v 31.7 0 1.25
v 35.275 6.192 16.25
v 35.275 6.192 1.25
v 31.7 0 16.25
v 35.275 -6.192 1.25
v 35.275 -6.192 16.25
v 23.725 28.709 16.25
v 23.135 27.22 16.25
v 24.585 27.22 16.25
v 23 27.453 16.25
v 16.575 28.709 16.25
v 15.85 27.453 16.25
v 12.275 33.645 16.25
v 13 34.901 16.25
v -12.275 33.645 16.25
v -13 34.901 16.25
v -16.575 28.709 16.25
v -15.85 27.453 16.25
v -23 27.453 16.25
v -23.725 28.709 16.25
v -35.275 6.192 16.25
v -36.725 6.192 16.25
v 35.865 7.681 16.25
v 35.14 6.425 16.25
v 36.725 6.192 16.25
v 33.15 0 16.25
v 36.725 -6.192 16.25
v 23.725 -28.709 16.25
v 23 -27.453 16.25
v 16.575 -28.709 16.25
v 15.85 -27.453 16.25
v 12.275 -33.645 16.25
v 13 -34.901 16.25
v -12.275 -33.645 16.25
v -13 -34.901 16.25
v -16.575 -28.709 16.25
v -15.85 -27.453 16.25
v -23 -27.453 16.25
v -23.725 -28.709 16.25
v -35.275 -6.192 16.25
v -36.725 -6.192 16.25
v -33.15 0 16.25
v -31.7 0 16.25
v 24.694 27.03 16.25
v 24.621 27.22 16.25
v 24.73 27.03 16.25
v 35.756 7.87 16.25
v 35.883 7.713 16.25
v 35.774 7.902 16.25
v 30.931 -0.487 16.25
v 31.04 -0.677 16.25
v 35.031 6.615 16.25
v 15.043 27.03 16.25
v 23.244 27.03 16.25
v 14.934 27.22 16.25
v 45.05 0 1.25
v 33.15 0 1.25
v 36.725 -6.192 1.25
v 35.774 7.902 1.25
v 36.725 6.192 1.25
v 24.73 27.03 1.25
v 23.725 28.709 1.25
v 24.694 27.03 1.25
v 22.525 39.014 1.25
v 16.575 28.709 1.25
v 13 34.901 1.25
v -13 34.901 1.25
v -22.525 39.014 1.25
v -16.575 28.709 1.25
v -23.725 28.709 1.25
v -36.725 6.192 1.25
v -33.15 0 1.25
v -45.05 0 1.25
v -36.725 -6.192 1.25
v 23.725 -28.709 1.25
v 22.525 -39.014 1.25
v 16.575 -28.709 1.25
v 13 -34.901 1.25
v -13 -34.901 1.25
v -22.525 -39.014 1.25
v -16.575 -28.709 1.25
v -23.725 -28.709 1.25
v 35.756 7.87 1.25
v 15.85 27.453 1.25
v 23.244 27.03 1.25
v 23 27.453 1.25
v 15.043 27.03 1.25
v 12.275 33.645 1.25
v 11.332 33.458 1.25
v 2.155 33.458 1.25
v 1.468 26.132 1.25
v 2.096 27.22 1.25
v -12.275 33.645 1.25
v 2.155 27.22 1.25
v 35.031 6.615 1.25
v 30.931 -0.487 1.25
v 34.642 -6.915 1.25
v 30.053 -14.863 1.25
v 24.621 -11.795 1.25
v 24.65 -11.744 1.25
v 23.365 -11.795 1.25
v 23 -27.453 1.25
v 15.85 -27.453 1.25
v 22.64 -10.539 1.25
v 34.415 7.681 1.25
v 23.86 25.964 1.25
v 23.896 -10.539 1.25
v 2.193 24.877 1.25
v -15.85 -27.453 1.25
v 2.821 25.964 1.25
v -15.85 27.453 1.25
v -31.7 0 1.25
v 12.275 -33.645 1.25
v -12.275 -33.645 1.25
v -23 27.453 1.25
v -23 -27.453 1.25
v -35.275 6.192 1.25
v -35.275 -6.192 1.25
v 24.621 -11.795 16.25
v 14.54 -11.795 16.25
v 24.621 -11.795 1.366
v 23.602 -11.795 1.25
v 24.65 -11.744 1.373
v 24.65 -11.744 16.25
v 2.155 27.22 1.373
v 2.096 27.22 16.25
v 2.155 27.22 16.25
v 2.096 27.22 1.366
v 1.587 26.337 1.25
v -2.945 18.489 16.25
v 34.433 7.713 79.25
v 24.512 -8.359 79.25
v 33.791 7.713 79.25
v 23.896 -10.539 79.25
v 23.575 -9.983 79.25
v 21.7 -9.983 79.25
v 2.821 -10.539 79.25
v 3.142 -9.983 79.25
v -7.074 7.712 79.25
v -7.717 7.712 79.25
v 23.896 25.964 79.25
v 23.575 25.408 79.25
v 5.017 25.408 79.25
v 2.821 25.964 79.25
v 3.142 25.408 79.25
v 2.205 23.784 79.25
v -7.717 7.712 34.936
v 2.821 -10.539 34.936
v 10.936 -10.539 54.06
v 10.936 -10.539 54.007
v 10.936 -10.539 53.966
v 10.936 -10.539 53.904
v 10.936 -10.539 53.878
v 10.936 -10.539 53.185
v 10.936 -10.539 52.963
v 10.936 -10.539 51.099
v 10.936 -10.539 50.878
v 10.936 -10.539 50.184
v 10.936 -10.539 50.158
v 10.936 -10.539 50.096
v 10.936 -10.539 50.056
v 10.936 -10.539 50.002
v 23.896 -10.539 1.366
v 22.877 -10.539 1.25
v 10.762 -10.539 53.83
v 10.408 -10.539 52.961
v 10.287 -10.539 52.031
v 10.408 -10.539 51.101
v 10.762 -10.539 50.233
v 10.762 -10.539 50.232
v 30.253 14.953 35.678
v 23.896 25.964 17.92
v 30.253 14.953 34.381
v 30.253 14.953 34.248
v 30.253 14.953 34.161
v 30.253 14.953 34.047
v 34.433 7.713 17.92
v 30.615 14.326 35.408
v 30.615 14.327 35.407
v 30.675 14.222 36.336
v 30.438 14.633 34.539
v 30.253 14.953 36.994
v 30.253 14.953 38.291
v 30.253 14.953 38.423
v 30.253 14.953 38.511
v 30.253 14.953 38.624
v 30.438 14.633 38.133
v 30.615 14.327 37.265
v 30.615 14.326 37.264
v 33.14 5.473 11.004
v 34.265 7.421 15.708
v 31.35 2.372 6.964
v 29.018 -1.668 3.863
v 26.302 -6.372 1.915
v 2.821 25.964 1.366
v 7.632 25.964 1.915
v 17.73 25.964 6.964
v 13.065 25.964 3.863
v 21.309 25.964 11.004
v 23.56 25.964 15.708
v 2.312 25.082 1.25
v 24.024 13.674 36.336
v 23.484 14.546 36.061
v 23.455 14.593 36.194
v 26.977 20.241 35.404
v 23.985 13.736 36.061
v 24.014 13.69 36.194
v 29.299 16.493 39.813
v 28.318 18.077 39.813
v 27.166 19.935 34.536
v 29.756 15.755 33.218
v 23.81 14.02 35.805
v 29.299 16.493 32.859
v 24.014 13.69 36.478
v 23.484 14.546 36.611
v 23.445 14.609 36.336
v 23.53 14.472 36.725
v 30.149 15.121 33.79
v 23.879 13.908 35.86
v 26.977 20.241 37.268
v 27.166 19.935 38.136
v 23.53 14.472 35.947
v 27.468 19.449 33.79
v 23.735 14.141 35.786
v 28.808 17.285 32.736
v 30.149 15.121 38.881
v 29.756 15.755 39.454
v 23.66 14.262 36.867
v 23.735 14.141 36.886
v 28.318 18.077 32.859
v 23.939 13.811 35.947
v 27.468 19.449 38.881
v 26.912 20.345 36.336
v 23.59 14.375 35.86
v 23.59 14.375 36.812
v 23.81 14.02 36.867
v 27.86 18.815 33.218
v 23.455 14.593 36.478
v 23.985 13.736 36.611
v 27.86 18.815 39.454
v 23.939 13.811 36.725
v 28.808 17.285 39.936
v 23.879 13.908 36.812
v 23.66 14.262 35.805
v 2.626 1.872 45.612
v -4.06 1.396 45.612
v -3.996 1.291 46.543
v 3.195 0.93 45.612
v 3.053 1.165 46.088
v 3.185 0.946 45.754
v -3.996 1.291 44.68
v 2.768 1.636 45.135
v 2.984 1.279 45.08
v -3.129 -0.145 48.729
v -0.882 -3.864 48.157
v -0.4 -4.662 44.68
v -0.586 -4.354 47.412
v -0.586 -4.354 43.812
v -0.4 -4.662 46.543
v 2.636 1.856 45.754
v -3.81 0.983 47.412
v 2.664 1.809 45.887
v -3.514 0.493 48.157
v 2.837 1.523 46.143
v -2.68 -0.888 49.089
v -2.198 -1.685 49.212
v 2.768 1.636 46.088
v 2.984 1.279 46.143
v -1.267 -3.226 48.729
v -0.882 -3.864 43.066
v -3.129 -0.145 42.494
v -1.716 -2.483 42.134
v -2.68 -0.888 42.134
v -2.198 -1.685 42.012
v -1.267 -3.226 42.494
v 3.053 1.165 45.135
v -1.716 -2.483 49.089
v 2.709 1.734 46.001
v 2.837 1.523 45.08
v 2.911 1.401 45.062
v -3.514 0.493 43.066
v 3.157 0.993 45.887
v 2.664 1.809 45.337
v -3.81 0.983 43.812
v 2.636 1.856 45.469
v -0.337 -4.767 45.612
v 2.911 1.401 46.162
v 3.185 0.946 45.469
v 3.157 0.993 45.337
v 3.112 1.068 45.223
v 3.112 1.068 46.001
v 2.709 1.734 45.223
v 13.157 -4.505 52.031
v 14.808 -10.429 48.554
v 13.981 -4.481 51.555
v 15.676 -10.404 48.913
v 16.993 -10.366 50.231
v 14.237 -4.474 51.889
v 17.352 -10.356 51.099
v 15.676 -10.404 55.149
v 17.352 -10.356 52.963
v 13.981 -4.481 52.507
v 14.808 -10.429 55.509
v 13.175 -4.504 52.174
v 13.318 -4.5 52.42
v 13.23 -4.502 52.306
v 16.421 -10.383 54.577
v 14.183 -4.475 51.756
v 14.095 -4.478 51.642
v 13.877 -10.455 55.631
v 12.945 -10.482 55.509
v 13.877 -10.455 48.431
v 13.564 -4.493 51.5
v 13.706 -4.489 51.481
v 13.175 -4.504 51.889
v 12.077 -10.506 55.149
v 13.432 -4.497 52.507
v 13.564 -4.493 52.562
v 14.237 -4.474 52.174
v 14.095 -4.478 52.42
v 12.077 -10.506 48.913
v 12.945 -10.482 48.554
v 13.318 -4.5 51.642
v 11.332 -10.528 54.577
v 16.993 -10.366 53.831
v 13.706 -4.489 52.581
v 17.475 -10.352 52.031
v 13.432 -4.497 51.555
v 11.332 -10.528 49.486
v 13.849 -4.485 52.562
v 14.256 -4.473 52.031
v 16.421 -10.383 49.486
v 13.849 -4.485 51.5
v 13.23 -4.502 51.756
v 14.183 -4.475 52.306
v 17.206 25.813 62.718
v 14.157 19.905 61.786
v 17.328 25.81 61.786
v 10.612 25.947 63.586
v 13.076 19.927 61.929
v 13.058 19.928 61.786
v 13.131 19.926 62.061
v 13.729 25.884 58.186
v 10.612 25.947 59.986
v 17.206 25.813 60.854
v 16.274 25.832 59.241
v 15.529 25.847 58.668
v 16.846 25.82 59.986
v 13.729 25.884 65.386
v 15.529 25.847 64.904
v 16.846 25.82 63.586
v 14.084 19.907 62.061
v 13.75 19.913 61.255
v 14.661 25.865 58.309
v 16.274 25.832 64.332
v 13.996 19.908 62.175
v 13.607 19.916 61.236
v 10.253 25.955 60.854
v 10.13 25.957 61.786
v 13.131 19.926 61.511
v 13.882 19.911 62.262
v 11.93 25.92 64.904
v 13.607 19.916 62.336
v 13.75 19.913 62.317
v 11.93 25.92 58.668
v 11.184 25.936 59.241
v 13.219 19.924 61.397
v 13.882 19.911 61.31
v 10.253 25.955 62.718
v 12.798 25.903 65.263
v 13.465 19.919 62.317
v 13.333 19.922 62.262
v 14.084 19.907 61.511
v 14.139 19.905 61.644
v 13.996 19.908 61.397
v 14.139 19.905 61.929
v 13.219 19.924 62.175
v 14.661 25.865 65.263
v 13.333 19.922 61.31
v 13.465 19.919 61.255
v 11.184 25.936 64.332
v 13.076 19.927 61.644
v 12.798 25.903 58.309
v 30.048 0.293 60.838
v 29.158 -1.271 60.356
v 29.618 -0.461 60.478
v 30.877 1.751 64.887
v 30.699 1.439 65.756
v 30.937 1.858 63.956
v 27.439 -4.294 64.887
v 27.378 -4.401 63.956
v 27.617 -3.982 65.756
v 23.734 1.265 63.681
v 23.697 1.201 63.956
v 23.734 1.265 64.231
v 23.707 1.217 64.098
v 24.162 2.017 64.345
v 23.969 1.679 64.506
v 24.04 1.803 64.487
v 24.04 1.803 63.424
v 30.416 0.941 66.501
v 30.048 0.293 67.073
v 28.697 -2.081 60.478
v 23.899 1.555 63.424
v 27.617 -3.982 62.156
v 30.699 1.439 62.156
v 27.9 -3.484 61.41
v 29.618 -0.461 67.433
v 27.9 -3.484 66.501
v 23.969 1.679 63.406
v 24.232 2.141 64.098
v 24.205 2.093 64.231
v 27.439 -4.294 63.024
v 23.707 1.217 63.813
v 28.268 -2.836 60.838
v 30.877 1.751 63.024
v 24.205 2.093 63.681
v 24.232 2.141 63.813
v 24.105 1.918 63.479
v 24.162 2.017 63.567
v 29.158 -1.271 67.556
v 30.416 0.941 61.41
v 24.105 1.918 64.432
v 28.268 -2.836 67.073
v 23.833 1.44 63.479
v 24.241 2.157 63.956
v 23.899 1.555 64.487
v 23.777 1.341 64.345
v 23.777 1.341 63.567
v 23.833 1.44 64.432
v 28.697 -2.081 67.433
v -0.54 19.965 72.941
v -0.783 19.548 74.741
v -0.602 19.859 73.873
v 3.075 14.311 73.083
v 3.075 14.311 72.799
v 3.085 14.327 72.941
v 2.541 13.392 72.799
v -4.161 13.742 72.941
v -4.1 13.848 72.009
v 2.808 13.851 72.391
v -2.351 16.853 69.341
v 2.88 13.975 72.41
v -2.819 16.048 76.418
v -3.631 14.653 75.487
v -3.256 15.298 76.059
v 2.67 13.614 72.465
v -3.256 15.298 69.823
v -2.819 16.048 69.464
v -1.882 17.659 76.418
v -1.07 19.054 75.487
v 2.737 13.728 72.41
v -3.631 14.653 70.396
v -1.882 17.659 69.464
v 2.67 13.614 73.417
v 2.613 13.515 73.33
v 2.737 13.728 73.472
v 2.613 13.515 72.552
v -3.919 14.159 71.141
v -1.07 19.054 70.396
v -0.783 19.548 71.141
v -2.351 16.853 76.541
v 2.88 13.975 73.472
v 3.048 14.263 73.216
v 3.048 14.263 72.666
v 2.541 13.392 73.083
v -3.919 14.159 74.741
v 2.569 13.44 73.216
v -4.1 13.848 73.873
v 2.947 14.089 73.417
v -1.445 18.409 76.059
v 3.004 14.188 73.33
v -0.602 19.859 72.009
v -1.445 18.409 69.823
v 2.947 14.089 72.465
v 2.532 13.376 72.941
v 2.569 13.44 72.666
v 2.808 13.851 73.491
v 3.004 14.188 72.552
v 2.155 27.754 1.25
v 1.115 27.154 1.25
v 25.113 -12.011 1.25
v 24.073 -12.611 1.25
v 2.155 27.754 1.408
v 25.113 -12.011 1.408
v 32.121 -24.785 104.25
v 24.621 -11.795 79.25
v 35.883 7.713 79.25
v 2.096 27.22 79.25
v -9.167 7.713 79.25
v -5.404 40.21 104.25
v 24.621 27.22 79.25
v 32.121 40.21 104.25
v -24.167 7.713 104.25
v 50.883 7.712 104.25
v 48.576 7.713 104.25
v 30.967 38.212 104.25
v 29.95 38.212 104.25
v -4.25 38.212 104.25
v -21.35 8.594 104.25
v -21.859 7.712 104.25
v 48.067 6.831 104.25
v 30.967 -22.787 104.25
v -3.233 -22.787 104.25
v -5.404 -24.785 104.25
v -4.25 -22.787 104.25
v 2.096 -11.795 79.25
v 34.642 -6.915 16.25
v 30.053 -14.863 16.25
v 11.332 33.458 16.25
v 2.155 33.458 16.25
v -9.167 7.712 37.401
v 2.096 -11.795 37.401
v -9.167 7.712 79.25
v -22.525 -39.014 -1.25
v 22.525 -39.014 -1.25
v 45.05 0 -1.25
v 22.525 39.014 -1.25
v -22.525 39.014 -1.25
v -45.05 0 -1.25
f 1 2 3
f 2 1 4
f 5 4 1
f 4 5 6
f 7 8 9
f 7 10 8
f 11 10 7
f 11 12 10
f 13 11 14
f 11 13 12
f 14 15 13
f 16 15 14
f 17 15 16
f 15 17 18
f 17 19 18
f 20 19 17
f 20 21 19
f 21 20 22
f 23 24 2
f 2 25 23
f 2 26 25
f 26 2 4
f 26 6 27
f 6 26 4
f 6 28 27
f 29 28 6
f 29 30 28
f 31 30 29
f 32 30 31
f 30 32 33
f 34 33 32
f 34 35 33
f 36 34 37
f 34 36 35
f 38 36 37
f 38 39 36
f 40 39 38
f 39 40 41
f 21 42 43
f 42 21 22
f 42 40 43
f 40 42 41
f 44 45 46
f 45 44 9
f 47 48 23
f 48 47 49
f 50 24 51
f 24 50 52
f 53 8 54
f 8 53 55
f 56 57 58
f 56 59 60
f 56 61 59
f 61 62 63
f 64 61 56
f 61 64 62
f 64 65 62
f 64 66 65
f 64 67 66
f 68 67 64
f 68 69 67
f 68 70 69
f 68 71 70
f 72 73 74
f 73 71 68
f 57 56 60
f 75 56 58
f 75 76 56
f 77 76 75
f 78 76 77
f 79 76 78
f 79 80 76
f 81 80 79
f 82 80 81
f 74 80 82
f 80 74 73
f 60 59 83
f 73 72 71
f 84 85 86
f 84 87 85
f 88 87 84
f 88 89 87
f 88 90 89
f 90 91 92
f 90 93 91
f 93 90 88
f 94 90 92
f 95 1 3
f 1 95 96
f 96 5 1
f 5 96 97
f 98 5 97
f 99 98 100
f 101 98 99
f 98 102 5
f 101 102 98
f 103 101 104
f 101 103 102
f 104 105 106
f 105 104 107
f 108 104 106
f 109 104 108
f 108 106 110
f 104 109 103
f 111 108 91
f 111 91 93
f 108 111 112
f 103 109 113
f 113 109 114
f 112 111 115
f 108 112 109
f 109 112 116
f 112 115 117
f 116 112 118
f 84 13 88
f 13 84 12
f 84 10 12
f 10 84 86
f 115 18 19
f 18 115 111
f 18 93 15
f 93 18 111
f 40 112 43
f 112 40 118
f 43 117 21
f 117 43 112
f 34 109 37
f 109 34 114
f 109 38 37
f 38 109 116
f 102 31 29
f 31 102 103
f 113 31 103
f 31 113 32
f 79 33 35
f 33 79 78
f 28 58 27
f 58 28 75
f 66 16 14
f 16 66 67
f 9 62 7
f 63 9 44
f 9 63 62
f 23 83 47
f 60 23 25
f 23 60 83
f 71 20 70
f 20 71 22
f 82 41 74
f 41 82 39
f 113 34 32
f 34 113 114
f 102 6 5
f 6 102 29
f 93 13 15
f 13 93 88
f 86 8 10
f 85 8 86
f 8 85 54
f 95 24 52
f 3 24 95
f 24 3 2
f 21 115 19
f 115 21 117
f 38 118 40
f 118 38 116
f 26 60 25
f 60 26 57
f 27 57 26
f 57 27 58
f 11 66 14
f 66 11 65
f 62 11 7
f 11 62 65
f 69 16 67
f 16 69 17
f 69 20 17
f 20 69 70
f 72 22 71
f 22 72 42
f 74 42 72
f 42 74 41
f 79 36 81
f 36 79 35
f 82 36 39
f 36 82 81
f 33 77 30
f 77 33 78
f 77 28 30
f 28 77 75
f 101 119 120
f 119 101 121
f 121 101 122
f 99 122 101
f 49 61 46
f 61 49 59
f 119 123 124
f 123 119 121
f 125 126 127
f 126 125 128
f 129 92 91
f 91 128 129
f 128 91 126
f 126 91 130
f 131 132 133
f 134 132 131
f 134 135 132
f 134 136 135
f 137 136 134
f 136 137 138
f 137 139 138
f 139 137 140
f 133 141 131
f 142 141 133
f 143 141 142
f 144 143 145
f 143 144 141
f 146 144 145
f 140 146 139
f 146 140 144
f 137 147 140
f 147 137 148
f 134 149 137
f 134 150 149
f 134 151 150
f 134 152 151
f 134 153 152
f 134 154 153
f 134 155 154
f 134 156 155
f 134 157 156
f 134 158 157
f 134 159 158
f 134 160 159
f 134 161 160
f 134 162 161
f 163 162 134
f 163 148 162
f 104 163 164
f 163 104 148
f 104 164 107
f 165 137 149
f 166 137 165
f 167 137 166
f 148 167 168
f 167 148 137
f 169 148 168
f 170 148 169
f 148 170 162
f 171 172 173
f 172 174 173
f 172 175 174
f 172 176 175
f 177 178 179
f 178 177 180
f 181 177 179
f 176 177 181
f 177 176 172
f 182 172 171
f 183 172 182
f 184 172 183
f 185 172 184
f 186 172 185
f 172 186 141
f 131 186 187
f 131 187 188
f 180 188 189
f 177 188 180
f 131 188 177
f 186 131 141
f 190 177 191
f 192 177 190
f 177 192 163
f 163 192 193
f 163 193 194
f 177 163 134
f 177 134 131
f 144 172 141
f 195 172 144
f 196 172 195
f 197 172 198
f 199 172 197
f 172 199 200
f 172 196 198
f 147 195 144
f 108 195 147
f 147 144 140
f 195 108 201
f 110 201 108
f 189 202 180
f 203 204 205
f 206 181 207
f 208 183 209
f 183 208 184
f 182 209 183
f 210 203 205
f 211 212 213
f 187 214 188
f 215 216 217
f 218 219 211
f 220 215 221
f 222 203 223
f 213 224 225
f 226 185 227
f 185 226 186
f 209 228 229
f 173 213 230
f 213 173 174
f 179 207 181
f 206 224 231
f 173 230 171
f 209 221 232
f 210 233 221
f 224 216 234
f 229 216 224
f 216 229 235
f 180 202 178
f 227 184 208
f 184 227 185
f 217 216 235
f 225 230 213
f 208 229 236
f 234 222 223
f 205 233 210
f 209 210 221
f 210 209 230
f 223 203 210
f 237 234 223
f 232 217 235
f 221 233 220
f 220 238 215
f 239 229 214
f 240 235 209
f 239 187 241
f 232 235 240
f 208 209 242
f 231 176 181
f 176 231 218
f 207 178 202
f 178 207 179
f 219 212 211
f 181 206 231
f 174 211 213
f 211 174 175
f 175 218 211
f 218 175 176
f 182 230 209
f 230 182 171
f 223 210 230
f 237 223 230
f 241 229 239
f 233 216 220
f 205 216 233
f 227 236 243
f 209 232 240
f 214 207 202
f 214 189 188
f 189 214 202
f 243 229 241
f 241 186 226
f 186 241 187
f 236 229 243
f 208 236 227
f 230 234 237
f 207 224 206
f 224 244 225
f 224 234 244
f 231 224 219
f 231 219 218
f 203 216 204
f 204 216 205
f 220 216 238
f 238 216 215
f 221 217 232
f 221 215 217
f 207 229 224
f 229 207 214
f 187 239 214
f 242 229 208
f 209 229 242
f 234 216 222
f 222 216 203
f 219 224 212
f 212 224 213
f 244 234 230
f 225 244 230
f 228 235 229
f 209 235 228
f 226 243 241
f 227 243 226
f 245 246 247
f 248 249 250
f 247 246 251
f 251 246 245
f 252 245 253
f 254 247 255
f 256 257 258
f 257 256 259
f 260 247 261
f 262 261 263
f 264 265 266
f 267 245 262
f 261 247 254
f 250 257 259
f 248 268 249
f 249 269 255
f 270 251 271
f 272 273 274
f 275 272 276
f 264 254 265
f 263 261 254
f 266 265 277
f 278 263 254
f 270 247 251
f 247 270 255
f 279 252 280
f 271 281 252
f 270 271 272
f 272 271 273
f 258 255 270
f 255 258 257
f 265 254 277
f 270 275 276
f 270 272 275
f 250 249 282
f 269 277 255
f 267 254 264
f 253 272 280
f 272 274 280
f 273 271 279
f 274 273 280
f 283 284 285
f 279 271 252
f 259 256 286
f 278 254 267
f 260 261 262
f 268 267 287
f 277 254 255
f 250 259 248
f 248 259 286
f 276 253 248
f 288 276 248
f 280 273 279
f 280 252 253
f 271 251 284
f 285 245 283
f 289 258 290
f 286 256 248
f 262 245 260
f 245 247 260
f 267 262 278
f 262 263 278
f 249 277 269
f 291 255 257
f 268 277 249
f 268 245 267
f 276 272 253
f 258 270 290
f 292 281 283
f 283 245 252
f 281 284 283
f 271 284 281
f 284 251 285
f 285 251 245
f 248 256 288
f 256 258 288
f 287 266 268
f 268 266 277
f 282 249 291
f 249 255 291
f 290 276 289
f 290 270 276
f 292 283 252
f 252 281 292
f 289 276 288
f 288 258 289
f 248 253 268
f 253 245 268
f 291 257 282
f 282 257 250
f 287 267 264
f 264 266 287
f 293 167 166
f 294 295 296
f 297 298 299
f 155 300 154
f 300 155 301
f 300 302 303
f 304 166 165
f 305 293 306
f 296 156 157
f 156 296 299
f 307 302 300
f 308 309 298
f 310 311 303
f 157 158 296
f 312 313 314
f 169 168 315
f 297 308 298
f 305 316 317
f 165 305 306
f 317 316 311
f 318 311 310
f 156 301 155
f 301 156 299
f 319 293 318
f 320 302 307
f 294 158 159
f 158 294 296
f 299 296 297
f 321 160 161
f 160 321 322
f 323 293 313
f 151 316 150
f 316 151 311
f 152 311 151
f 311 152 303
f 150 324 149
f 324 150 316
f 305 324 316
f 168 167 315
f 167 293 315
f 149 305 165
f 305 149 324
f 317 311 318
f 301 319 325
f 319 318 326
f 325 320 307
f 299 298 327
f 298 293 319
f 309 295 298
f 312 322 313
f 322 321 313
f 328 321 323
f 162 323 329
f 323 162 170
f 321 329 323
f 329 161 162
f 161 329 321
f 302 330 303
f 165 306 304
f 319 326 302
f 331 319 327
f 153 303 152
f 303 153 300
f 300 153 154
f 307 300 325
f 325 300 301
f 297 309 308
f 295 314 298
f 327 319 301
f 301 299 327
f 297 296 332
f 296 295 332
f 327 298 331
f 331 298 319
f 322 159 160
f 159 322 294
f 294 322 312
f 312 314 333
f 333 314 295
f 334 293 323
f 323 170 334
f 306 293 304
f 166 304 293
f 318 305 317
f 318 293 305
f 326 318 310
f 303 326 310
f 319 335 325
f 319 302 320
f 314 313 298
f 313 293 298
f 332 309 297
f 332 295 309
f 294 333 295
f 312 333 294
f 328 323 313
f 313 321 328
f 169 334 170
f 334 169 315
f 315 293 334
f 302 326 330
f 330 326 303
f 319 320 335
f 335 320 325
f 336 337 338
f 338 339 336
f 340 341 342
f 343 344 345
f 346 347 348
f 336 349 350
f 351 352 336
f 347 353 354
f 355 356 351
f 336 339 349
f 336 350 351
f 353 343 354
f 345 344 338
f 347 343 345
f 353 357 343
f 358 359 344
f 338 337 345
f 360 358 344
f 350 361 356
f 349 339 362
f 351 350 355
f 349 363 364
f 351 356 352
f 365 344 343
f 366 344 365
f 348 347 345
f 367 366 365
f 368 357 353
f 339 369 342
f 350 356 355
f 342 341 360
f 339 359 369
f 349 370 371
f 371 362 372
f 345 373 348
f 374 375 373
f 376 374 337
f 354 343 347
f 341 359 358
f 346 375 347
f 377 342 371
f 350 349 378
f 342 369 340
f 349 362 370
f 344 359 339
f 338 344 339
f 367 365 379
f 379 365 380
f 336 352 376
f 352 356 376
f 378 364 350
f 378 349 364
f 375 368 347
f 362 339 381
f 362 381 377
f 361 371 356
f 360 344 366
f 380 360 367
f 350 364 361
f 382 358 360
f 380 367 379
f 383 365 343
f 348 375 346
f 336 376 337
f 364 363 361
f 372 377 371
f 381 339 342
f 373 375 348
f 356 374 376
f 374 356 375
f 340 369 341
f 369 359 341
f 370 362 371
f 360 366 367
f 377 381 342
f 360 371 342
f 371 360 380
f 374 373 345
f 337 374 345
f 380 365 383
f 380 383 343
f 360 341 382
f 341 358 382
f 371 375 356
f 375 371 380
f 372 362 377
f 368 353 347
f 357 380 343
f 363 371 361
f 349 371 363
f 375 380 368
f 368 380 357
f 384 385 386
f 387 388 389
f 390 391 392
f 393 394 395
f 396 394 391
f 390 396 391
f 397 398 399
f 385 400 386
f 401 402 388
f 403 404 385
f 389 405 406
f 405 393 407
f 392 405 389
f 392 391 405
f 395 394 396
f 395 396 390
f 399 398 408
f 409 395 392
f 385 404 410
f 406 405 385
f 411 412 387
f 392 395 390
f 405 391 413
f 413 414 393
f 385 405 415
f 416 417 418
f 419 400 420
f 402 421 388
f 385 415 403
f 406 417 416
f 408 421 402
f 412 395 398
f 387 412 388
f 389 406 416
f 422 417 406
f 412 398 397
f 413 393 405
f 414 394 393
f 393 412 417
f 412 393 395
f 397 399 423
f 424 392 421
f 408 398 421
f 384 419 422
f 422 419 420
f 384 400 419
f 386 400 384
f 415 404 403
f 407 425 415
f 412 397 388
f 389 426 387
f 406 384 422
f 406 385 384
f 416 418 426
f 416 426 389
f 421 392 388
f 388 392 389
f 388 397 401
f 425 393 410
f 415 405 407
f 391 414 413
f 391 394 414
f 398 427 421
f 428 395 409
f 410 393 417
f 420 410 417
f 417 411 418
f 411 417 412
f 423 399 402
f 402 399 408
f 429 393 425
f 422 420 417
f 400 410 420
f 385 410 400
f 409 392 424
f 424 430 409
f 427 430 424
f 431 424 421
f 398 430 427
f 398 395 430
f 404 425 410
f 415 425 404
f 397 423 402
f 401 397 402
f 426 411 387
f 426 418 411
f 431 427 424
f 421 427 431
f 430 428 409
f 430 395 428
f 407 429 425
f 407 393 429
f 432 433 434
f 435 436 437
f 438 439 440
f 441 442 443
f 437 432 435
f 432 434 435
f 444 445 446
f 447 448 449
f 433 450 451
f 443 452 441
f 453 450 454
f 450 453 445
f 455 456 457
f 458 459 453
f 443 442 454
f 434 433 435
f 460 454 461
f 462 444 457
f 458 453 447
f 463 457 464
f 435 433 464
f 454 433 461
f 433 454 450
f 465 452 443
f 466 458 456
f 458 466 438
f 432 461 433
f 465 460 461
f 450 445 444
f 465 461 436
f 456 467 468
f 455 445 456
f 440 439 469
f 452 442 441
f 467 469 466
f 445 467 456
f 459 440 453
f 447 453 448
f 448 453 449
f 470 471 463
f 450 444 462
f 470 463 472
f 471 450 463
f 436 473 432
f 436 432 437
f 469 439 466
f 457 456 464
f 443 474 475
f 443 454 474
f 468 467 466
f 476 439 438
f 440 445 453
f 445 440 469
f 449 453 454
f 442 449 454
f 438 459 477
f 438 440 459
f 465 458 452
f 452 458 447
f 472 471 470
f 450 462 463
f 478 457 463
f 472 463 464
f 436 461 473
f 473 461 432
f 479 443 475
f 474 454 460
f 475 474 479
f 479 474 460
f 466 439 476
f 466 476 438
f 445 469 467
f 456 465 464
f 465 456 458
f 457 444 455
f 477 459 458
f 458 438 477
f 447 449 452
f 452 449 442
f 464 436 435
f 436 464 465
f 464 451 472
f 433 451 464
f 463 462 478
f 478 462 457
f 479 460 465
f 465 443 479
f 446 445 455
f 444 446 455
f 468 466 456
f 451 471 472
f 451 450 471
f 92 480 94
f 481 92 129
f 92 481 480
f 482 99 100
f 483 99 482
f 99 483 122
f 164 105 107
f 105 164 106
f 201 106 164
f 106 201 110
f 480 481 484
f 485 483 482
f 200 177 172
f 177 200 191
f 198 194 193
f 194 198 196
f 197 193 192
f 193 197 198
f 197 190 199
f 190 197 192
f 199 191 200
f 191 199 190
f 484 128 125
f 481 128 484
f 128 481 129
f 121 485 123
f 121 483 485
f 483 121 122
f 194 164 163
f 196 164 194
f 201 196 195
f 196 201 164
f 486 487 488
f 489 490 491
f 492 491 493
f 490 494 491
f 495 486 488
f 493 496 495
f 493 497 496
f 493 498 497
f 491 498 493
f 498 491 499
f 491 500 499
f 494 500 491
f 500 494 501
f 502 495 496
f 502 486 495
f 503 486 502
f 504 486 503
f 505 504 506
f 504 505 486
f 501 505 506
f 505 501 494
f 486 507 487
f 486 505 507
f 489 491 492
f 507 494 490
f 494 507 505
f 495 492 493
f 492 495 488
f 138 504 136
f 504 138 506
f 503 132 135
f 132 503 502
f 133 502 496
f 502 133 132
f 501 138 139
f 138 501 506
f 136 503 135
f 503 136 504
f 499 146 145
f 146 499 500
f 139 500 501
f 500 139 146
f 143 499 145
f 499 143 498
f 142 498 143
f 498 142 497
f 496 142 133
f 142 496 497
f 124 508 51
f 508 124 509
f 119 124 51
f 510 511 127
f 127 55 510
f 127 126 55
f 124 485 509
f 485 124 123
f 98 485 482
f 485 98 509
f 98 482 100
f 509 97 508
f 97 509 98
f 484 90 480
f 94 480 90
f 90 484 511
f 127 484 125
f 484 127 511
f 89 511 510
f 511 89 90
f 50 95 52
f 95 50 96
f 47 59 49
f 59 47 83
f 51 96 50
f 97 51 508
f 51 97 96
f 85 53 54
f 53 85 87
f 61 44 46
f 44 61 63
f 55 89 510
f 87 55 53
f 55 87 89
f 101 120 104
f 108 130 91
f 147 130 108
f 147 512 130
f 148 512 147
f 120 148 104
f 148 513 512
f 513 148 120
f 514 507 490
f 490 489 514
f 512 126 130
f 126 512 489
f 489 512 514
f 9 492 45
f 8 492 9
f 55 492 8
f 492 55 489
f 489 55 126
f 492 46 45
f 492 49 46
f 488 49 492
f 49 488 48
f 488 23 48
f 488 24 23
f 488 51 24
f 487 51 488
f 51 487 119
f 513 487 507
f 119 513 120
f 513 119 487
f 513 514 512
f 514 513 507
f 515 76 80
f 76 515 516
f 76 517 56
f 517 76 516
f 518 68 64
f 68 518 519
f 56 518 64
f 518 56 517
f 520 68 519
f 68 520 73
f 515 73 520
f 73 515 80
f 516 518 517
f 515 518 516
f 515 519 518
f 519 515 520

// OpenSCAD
//
$fn = $preview ? 16 : 24;

base_h = 2.5;
base_d = 90 + 0.1;

border_d = base_d - 9.5;
border_w = 2.9;
border_h = 15;
place_d = 23;

tower_d = base_d/2 + 0 * 1.3 * border_w;
tower_h = 78;
cos30 = cos(30);
echo(str("cos30=", cos30));
//tower_x = sin(60) * base_d/4 - border_w*3;
tower_x = base_d/2 - tower_d/2 - (base_d - border_d)/2 - border_w/2 - 0.9;
//tower_x = base_d/2 - tower_d/2 - (border_d - border_w)/2;
tower_y = cos(60) * tower_x;
obs_h = tower_d/3 - 3.12 * border_w;
obs_bs1 = 7.2;
obs_bs2 = 1.1;

rut_h = tower_d/2*cos30;
rut_b = tower_d / 1 + cos30;

rem_out_pla_inner_x = +07.8;
rem_out_pla_outer_y = -16.4;

tri_h  = 25;
tri_d2 = tower_d + 30;

// base 
cylinder(h=base_h, d=base_d, center=true, $fn=6);

// border 
translate([0, 0, base_h/2])
difference(){
    union () {
        cylinder(h=border_h, d=border_d, $fn=6);
    }
    // remove inner to get border
    cylinder(h=border_h, d=border_d - border_w,  $fn=6);
    // remove 6 places
    for (i = [0:5]){
        rotate(i * 60)
        translate([ (border_d/2 - 0*place_d/2 + 1*border_w), 0, 0])
        cylinder(h=border_h, d=place_d - 0 * border_w, $fn=6);
    }
    
}
// place_bordes
translate([0, 0, base_h/2])
difference(){
    for (i = [0:5]){
        rotate(i * 60)
        translate([ (border_d/2 - 0*place_d/2 + 1*border_w), 0, 0])
        cylinder(h = border_h, d=place_d + 0 * border_w, $fn=6);
    }
    remove_place_outside(border_d/2 - 0*place_d/2 + 1*border_w, 0, 5, 0, 0, false);
    difference() {
        cylinder(h = border_h, d=base_d + place_d, $fn=6);
        //cylinder(h = border_h, d=base_d - 3.45 * border_w, $fn=6);
        cylinder(h = border_h, d=border_d, $fn=6);
    }
}

module remove_place_outside(trans_x, from, to, inner_x, outer_y, move_first_turn_then) {
    for (i = [from:to]){
        if (move_first_turn_then) {
            translate([0, outer_y, 0])
            rotate(i * 60)    
            translate([trans_x + inner_x, 0 , 0])
            cylinder(h = border_h, d=place_d - 1 * border_w, $fn=6);
    } else {
            rotate(i * 60)
            translate([trans_x + inner_x, 0 , 0])
            cylinder(h = border_h, d=place_d - 1 * border_w, $fn=6);
        }
    }
}

// tower0
rotate(30)
translate([0, 0, base_h/2])
translate([tower_x, 0, 0])
rotate(270)
difference(){
    union() {
        //linear_extrude(height = tower_h)
        union(){                                        
            difference(){
                cylinder(h=tower_h, d=tower_d, $fn=6);
                cylinder(h=tower_h + 3, d=tower_d - border_w, $fn=6);
            }
        }                                               
        // obstacles                                    
        obstacles();
        // tbc
        rotate(120)
        translate([0, -tower_d/2, border_h/2])
        cube([tower_d/2*cos30 + border_w, 
          cos30*
          (border_d/2 - tower_d/2 - border_w )/2, 
          border_h], true);

        rotate(60)
        translate([0, tower_d/2, border_h/2])
        cube([tower_d/2*cos30 + border_w,
          cos30*
          (border_d/2 - tower_d/2 - border_w )/2, 
          border_h], true);
        // rutsche
        translate([0, tower_d/2 - rut_h/2 - border_w - 1, rut_h/2 - 0])
        rotate([0, 90, 180])
        difference() {
            cube([rut_h,rut_h,rut_b], true);
            translate([-rut_h/2, rut_h/2, 0])
            cylinder(h=rut_b, r=rut_h, center=true);
            translate([0, 0, border_h])
            linear_extrude(height = tower_h - border_h)
            difference()
            {
                circle(d=tower_d + 10*border_w, $fn=6);
                circle(d=tower_d + 0.5 * border_w, $fn=6);    
            }
        }
        // trichter
        translate([0, 0, tower_h])
        trichter();
    }
    // auslass
    translate([0, - tower_d/2 - 6.9, 6])
    rotate([27])
    cube([tower_d * 2, tower_d, tower_d], center=true);
    // remove inside
    /*  
    difference(){ // XXX: needed ???
        cylinder(h=border_h, d=tower_d - border_w, $fn=6);
        translate([0, tower_d/2-7, base_h*4])
        cube([30, 6, border_h], true);
    } */
    // remove all outside
    translate([0, 0, border_h])
    linear_extrude(height = tower_h - border_h)
    difference()
    {
        circle(d=tower_d + 10 * border_w, $fn=6);
        circle(d=tower_d + 0 * border_w, $fn=6);    
    }
    // TODO: move_first_turn_then
    remove_place_outside(tower_d/2 + place_d/2, 1, 2, rem_out_pla_inner_x, rem_out_pla_outer_y, true);
}

module obstacles(height, rotate){
    echo(str("module obstacles (height, rotate)=", height, rotate));
    obstacle(37 + rands(-3, +3, 1)[0], 0 * 60 + rands(-3, +3, 1)[0]);
    obstacle(47 + rands(-3, +3, 1)[0], 3 * 60 + rands(-3, +3, 1)[0]);
    obstacle(49 + rands(-3, +3, 1)[0], 4 * 60 + rands(-3, +3, 1)[0]);
    obstacle(58 + rands(-3, +3, 1)[0], 1 * 60 + rands(-3, +3, 1)[0]);
    obstacle(65 + rands(-3, +3, 1)[0], 5 * 60 + rands(-3, +3, 1)[0]);
    obstacle(73 + rands(-3, +3, 1)[0], 2 * 60 + rands(-3, +3, 1)[0]);
}

module obstacle(height, rotate) {
    rotate(rotate)
    translate([0, tower_d/2 - 1.5 * border_w - obs_h/2, height])
    rotate([90, 0, 0])
    cylinder(h=obs_h, d1=obs_bs1, d2=obs_bs2, center=true);    
}

module trichter() {
    difference()
    {
        cylinder(h=tri_h, d1=tower_d, d2=tri_d2, $fn = 6);
        translate([00, 0, -border_w/2])
        cylinder(h=tri_h + border_w*1, d1=tower_d - 2*border_w - 0.1, d2=tri_d2 - border_w, $fn = 6);
    }
}
